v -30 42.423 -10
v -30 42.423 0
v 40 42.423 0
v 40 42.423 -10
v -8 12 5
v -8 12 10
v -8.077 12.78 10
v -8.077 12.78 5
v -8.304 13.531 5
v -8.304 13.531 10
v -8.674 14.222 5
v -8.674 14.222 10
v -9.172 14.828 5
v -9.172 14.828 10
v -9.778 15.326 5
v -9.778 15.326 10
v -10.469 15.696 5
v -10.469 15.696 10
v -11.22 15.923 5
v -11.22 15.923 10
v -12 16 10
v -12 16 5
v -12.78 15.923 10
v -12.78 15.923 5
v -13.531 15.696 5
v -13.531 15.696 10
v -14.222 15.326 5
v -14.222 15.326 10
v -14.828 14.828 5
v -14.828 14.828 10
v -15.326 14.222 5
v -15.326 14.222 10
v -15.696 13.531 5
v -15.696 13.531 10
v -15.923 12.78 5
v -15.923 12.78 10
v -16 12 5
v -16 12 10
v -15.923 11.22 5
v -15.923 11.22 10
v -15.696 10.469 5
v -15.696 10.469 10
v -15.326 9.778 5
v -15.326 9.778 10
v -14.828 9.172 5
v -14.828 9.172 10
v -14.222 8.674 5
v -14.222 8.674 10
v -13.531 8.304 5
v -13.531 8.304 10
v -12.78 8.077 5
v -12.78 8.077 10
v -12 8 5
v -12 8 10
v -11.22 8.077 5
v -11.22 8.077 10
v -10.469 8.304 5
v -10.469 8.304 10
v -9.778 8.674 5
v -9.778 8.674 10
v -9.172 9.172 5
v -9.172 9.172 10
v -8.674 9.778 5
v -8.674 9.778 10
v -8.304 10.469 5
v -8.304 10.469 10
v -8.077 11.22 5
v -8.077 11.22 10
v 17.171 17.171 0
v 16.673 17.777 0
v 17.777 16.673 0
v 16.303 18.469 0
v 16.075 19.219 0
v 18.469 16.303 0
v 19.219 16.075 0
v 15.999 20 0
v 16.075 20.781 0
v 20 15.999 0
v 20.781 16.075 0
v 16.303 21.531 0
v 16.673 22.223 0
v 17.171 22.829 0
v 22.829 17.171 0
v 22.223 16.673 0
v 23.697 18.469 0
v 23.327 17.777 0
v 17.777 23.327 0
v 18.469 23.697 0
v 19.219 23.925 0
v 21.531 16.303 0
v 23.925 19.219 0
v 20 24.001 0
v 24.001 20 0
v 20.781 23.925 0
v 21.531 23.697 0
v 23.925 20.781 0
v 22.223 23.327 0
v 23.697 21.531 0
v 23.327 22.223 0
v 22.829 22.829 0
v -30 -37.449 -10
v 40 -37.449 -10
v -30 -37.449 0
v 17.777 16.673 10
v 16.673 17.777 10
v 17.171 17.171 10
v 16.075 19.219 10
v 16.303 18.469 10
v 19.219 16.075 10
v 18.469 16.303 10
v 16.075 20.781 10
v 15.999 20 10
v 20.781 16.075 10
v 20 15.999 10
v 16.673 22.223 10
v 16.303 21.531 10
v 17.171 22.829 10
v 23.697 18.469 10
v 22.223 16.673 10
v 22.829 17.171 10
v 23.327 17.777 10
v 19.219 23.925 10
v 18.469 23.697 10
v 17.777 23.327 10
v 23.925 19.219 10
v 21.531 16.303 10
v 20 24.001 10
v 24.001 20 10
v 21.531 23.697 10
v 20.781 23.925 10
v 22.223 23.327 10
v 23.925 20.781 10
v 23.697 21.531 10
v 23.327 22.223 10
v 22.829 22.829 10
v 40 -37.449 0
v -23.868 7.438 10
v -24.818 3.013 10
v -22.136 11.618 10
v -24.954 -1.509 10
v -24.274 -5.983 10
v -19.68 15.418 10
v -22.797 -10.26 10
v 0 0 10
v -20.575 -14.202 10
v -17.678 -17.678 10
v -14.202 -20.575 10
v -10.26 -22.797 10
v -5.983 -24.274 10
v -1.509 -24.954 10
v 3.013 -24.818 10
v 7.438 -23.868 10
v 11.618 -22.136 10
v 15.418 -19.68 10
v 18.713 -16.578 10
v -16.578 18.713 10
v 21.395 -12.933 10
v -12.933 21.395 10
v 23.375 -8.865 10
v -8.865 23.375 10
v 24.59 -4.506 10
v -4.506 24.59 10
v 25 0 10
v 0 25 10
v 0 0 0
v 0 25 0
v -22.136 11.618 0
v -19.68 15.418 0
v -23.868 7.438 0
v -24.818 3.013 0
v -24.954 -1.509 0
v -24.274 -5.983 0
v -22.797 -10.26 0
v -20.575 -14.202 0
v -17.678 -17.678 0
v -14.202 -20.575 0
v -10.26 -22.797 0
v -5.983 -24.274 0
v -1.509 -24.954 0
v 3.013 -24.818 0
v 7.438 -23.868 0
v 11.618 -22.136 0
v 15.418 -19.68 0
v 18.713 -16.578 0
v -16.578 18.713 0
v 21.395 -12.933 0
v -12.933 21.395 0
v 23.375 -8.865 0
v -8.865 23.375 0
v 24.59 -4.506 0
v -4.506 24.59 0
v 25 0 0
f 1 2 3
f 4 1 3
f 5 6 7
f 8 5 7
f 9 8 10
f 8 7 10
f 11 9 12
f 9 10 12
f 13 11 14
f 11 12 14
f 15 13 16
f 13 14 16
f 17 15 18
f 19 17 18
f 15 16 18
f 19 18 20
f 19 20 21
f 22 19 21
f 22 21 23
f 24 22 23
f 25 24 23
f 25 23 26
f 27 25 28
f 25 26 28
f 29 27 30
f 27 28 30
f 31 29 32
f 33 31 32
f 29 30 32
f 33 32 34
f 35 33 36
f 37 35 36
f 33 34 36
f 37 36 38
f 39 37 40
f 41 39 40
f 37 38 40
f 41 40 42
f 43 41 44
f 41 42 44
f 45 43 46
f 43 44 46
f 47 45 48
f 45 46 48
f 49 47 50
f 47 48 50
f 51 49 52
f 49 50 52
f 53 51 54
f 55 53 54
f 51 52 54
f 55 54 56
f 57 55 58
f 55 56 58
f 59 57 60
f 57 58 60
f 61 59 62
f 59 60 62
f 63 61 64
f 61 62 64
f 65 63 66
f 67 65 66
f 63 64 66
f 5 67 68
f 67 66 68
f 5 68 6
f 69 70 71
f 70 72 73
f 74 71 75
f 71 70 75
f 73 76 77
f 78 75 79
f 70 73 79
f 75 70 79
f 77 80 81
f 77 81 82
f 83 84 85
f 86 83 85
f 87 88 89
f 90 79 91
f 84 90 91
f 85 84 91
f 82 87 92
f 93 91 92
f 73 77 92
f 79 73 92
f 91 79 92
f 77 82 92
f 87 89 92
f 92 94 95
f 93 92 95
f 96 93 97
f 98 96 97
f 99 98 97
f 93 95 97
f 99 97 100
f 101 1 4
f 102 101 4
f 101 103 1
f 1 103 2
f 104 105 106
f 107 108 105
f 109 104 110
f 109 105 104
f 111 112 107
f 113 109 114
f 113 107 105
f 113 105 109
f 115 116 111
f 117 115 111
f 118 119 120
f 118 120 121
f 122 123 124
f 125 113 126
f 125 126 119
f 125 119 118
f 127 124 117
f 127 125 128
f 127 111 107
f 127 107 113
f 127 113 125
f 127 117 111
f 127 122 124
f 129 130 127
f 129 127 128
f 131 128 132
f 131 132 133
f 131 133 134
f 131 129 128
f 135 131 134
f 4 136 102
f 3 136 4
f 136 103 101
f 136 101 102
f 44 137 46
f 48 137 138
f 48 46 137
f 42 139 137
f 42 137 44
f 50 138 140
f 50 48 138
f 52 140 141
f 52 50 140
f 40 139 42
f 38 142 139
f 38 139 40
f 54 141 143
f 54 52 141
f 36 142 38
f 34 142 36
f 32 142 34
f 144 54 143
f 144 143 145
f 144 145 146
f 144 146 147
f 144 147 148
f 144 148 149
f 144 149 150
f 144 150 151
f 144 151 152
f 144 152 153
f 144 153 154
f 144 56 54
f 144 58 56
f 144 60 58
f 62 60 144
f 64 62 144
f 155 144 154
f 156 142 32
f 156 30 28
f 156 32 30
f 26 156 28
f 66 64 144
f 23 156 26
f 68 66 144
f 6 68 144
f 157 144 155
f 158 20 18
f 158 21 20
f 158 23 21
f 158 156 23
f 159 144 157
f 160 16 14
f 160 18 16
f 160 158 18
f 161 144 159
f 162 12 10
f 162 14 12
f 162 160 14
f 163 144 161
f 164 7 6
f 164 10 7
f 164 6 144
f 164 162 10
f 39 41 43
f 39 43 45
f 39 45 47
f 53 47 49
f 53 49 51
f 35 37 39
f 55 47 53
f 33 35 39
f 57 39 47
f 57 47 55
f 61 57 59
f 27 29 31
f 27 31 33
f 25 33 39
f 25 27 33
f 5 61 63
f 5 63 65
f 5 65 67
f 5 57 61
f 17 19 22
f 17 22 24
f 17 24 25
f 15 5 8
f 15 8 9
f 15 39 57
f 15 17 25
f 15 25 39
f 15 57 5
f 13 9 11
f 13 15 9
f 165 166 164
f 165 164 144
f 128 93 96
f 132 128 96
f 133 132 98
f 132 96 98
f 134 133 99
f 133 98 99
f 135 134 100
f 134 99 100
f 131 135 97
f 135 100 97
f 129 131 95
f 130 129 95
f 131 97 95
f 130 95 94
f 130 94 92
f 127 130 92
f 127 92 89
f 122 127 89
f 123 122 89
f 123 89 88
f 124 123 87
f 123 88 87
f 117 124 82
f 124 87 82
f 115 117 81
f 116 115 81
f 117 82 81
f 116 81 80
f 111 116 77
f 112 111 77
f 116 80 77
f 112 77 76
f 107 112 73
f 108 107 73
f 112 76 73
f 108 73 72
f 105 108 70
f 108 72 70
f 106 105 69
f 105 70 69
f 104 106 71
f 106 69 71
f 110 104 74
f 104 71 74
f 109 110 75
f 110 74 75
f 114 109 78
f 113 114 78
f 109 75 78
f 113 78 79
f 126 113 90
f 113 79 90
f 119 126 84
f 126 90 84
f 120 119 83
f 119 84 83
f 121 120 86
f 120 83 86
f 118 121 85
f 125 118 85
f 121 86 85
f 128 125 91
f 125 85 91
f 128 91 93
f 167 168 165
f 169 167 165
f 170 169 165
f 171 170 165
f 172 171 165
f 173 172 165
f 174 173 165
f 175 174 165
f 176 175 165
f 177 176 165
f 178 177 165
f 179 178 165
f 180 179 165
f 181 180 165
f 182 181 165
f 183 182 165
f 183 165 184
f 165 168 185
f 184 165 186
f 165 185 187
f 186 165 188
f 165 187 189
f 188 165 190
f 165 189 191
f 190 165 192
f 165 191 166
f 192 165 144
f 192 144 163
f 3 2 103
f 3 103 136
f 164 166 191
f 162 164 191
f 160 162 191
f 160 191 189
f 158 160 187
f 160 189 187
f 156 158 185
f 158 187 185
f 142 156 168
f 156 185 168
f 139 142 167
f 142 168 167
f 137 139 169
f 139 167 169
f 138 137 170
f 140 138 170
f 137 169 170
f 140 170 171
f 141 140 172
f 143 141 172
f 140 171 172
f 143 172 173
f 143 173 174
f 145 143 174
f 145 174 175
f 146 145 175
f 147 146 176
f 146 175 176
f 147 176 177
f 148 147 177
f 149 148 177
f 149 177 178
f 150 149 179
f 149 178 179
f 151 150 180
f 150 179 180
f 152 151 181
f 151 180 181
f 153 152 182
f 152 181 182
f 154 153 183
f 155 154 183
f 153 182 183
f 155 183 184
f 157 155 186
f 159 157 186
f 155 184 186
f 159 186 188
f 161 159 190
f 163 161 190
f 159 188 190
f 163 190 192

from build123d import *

# Parameters (mm, degrees)
PAD_DEPTH    = 10
SKETCH001_R  = 4
POCKET_DEPTH = 5
SKETCH002_R  = 4.001439
PAD001_DEPTH = 10
SKETCH003_W  = 70
SKETCH003_H  = 79.871796
PAD002_DEPTH = 10


with BuildPart() as pacman:
    # Sketch → Pad (new body)
    with BuildSketch(Plane.XY):
        with BuildLine():
            ThreePointArc((0, 25), (-17.67767, -17.67767), (25, 0))
            Line((0, 0), (25, 0))
            Line((0, 25), (0, 0))
        make_face()
    extrude(amount=PAD_DEPTH)

    # Sketch001 (on Face5 of Pad) → Pocket (cut)
    with BuildSketch(Plane.XY.offset(10)):
        with Locations((-12, 12)):
            Circle(SKETCH001_R)
    extrude(amount=-POCKET_DEPTH, mode=Mode.SUBTRACT)


with BuildPart() as matur:
    # Sketch002 → Pad001 (new body)
    with BuildSketch(Plane.XY):
        with Locations((20, 20)):
            Circle(SKETCH002_R)
    extrude(amount=PAD001_DEPTH)


with BuildPart() as base:
    # Sketch003 → Pad002 (new body)
    with BuildSketch(Plane.XY):
        with Locations((5, 2.486687)):
            Rectangle(SKETCH003_W, SKETCH003_H)
    extrude(amount=-PAD002_DEPTH)


solid = Compound([pacman.part, matur.part, base.part])
